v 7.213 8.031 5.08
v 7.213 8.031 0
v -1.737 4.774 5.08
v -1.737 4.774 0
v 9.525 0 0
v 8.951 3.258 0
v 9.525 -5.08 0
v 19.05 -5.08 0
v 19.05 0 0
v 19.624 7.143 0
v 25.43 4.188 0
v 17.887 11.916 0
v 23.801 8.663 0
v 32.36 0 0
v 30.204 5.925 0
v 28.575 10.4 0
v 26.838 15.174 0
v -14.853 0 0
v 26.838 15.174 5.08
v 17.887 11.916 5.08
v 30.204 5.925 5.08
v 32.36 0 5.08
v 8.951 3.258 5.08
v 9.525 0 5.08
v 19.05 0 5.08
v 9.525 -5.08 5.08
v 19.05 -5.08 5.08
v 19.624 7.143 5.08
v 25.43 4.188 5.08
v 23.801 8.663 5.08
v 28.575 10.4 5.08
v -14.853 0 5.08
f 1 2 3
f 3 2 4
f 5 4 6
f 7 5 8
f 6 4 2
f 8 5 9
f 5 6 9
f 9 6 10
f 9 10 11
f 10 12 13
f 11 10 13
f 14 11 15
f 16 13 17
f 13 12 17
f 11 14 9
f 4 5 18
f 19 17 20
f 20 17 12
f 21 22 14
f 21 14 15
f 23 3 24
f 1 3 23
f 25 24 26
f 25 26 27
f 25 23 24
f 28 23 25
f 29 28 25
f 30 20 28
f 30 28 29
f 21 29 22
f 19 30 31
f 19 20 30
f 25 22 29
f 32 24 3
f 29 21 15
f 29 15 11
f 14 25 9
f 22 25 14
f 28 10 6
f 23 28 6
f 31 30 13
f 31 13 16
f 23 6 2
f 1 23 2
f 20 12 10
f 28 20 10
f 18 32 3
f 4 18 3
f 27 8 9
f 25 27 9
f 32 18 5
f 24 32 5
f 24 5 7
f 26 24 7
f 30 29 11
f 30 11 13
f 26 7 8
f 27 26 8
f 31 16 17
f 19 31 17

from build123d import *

# Parameters (mm, degrees)
BOSS_EXTRUDE1_DEPTH = 5.08
BOSS_EXTRUDE2_DEPTH = 5.08
CUT_EXTRUDE1_DEPTH  = 6.08


with BuildPart() as part:
    # Sketch1 → Boss-Extrude1 (new body)
    with BuildSketch(Plane.XY):
        Polygon((19.624427787, 7.142707579), (8.950572213, 3.257741865), (7.213109885, 8.031380379), (-1.737462328, 4.773638514), (0, 0), (9.525, 0), (9.525, -5.08), (19.05, -5.08), (19.05, 0), (28.575, 0), (28.575, 10.400449444), (26.837537672, 15.174087958), (17.886965459, 11.916346093), align=None)
    extrude(amount=BOSS_EXTRUDE1_DEPTH)

    # Sketch2 → Boss-Extrude2 (add)
    with BuildSketch(Plane.XY.offset(5.08)):
        Polygon((28.575, 10.400449444), (28.575, 0), (32.360454021, 0), align=None)
        Polygon((0, 0), (-14.852926353, 0), (-1.737462328, 4.773638514), align=None)
    extrude(amount=-BOSS_EXTRUDE2_DEPTH)

    # Sketch3 → Cut-Extrude1 (cut, through all)
    with BuildSketch(Plane.XY.offset(5.08)):
        Polygon((28.575, 10.400449444), (30.203870933, 5.925163338), (25.430232419, 4.18770101), (23.801361486, 8.662987116), align=None)
    extrude(amount=-CUT_EXTRUDE1_DEPTH, mode=Mode.SUBTRACT)


solid = part.part
